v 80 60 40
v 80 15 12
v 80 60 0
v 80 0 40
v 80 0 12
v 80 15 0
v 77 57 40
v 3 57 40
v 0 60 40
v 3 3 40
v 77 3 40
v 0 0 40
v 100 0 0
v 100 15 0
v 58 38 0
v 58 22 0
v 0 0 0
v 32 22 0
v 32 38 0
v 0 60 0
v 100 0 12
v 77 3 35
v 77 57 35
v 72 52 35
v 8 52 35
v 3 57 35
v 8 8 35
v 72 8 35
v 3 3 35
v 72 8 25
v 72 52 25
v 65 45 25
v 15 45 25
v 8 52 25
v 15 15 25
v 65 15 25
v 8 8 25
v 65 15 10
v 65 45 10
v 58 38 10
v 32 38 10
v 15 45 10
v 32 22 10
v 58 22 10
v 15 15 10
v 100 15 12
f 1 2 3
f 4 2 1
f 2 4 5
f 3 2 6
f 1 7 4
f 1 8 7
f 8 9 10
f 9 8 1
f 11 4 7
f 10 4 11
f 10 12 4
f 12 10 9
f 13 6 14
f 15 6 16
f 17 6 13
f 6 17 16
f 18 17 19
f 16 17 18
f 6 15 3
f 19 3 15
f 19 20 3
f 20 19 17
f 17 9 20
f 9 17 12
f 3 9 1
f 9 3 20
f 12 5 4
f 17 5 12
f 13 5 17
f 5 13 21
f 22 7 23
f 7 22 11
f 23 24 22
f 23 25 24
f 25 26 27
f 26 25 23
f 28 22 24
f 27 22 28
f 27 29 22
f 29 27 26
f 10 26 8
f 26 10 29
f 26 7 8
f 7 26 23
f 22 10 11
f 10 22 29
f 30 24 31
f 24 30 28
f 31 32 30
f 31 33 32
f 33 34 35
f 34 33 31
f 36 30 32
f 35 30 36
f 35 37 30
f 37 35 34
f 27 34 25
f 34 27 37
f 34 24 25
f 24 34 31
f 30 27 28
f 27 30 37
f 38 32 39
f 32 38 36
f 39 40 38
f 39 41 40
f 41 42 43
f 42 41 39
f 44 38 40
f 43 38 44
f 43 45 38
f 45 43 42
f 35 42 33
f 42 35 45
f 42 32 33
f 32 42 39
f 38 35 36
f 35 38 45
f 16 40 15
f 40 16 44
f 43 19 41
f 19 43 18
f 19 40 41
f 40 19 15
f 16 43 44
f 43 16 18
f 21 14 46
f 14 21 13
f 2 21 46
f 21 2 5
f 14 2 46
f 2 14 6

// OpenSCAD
// Main parameters
outer_width = 80;
outer_depth = 60;
outer_height = 40;
rim_thickness = 3;
rim_height = 5;
upper_recess_depth = 10;
upper_recess_inset = 8;
middle_recess_depth = 15;
middle_recess_inset = 15;
lower_recess_depth = 20;
lower_recess_inset = 22;
lower_recess_shift = 10;  // Shift deepest pocket to one side

// Side projection parameters
projection_width = 20;
projection_depth = 15;
projection_height = 12;
side_recess_depth = 8;
side_recess_height = 6;

// Resolution control
$fn = 50;

// Main body with stepped cavity
module main_body() {
    difference() {
        // Outer solid block
        cube([outer_width, outer_depth, outer_height]);
        
        // Top rim (thin border)
        translate([rim_thickness, rim_thickness, outer_height - rim_height])
            cube([outer_width - 2*rim_thickness, 
                  outer_depth - 2*rim_thickness, 
                  rim_height + 1]);
        
        // Upper recess (broad)
        translate([upper_recess_inset, upper_recess_inset, 
                   outer_height - rim_height - upper_recess_depth])
            cube([outer_width - 2*upper_recess_inset, 
                  outer_depth - 2*upper_recess_inset, 
                  upper_recess_depth + 1]);
        
        // Middle recess (smaller inset)
        translate([middle_recess_inset, middle_recess_inset, 
                   outer_height - rim_height - upper_recess_depth - middle_recess_depth])
            cube([outer_width - 2*middle_recess_inset, 
                  outer_depth - 2*middle_recess_inset, 
                  middle_recess_depth + 1]);
        
        // Lower recess (deepest, shifted to one side)
        translate([lower_recess_inset + lower_recess_shift, 
                   lower_recess_inset, 
                   outer_height - rim_height - upper_recess_depth - middle_recess_depth - lower_recess_depth])
            cube([outer_width - 2*lower_recess_inset - lower_recess_shift, 
                  outer_depth - 2*lower_recess_inset, 
                  lower_recess_depth + 1]);
    }
}

// Side projection with recess
module side_projection() {
    union() {
        // Rectangular projection
        translate([outer_width, 0, 0])
            cube([projection_width, projection_depth, projection_height]);
        
        // Side recess above projection (creates stepped depth tier)
        translate([outer_width - side_recess_depth, 
                   0, 
                   projection_height])
            cube([side_recess_depth, projection_depth, side_recess_height]);
    }
}

// Final assembly
union() {
    main_body();
    side_projection();
}
